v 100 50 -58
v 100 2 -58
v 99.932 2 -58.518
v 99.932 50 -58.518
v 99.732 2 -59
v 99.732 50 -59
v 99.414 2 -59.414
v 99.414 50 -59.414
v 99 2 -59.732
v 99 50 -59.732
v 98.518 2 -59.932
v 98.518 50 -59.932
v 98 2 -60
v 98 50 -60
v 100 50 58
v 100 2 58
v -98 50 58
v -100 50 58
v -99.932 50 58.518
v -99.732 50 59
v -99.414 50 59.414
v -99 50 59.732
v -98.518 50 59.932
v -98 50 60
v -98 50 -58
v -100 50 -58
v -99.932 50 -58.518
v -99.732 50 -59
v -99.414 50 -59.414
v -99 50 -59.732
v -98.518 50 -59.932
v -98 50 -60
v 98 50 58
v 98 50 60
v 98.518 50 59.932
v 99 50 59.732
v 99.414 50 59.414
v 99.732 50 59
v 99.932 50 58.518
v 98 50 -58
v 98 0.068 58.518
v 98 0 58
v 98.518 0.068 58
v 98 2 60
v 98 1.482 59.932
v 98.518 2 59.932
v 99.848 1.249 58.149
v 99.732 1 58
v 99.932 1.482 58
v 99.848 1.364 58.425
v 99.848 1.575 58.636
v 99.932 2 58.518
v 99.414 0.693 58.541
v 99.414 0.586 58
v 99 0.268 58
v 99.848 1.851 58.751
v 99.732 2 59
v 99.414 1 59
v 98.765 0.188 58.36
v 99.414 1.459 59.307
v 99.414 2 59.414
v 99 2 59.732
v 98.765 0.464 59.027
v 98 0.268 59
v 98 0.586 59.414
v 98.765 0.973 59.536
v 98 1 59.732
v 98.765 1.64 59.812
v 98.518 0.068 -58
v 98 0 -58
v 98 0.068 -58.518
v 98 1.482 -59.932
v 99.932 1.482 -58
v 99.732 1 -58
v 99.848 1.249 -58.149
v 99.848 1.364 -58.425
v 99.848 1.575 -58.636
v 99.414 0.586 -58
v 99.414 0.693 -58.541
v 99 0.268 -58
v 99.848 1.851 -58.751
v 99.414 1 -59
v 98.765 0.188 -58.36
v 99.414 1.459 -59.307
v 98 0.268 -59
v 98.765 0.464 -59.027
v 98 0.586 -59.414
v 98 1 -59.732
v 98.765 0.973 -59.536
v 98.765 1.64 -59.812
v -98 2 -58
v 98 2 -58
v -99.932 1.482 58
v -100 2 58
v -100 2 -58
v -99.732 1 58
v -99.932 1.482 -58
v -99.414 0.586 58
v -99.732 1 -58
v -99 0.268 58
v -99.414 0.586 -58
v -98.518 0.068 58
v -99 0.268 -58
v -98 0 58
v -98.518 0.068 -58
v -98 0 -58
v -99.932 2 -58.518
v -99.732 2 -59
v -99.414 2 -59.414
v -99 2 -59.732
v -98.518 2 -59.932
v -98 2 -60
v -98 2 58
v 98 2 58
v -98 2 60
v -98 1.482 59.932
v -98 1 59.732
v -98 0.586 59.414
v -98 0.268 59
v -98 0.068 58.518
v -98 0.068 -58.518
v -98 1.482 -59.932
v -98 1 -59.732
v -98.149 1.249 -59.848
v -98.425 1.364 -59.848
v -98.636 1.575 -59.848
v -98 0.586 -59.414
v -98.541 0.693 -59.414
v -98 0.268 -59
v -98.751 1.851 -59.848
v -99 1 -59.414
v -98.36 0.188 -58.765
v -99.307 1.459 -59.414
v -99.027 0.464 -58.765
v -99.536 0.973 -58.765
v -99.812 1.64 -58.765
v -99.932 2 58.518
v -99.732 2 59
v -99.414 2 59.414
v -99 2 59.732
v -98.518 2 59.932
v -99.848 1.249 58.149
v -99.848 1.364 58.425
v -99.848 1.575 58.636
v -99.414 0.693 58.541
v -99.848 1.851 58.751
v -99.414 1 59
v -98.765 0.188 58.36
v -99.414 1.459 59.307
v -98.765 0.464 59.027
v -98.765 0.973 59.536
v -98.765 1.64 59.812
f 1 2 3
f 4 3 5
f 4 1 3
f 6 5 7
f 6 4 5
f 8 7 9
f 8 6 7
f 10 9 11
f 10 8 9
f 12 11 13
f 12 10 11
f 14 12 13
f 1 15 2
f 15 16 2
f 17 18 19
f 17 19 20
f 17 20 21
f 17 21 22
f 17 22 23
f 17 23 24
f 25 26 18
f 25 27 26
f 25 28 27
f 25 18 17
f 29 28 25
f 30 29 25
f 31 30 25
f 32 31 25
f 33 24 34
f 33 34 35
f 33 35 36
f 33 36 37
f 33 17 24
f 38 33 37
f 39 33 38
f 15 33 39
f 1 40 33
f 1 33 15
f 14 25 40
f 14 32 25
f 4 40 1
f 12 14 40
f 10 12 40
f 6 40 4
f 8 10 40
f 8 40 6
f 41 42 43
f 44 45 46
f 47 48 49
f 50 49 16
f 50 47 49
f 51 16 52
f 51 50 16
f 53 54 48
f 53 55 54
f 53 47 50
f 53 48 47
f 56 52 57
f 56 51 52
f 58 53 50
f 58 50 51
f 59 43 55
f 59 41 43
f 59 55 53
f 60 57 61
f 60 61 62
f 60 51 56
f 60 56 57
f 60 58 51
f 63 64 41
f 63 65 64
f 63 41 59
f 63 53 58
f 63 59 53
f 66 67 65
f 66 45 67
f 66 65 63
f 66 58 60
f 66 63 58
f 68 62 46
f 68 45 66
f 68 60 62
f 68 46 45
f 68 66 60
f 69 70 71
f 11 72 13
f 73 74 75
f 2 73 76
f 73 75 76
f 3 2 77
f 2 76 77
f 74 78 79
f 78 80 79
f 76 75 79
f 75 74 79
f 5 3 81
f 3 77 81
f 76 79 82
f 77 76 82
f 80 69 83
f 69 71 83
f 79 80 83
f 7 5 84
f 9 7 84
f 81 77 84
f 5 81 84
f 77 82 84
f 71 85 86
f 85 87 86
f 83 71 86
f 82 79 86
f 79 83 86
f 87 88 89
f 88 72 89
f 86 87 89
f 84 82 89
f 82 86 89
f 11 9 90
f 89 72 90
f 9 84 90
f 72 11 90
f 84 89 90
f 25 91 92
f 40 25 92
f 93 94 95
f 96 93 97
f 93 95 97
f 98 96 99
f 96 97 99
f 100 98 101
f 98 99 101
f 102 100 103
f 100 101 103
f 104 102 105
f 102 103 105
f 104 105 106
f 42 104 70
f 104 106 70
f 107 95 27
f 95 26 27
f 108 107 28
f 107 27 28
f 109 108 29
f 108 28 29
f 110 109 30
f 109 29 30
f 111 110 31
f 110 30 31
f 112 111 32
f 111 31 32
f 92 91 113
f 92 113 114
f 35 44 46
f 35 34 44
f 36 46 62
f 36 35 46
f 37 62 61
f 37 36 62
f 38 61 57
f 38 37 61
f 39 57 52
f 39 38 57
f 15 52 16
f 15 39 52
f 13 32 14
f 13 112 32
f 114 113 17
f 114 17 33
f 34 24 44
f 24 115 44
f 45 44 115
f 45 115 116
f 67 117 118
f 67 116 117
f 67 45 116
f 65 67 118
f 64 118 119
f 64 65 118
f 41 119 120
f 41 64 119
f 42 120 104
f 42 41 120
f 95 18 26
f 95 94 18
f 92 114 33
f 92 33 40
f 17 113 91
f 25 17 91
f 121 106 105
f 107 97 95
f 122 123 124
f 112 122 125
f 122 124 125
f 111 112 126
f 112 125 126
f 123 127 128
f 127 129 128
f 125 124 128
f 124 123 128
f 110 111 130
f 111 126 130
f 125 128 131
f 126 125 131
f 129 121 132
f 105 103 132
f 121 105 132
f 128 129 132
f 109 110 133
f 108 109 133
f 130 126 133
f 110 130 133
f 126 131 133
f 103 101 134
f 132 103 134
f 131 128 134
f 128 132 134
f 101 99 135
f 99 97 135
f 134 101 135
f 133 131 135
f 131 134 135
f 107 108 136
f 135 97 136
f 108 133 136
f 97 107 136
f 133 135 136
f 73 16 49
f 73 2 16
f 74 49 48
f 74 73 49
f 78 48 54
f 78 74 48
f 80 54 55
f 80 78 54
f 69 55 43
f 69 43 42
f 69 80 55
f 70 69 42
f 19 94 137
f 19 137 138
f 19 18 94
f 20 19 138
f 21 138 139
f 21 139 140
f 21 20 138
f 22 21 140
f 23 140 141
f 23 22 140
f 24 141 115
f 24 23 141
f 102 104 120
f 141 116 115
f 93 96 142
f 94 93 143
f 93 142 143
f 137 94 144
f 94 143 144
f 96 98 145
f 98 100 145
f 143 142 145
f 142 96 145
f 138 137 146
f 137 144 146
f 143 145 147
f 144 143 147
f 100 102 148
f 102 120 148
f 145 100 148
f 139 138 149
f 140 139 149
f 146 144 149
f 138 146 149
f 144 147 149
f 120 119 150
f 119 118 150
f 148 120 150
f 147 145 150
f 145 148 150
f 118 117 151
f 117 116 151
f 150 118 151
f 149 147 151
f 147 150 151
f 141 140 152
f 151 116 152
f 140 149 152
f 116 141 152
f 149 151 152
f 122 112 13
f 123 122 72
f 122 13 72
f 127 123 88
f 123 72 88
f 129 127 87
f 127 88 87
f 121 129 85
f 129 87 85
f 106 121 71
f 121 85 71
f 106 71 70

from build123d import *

# Parameters (mm, degrees)
SKETCH1_W           = 200
SKETCH1_H           = 120
BOSS_EXTRUDE1_DEPTH = 50
SHELL2_T            = -2
FILLET1_R           = 2


with BuildPart() as part:
    # Sketch1 → Boss-Extrude1 (new body)
    with BuildSketch(Plane(origin=(0, 0, 0), x_dir=(1, 0, 0), z_dir=(0, 1, 0))):
        Rectangle(SKETCH1_W, SKETCH1_H)
    extrude(amount=BOSS_EXTRUDE1_DEPTH)

    # Shell2
    shell2_openings = [part.faces().sort_by_distance(p)[0] for p in [
        (0, 50, 0),
    ]]
    offset(amount=SHELL2_T, openings=shell2_openings, kind=Kind.INTERSECTION)

    # Fillet1
    fillet1_edges = [part.edges().sort_by_distance(p)[0] for p in [
        (0, 0, 60),
        (-100, 0, 0),
        (0, 0, -60),
        (100, 0, 0),
        (100, 25, 60),
        (-100, 25, 60),
        (-100, 25, -60),
        (100, 25, -60),
    ]]
    fillet(fillet1_edges, radius=FILLET1_R)


solid = part.part
